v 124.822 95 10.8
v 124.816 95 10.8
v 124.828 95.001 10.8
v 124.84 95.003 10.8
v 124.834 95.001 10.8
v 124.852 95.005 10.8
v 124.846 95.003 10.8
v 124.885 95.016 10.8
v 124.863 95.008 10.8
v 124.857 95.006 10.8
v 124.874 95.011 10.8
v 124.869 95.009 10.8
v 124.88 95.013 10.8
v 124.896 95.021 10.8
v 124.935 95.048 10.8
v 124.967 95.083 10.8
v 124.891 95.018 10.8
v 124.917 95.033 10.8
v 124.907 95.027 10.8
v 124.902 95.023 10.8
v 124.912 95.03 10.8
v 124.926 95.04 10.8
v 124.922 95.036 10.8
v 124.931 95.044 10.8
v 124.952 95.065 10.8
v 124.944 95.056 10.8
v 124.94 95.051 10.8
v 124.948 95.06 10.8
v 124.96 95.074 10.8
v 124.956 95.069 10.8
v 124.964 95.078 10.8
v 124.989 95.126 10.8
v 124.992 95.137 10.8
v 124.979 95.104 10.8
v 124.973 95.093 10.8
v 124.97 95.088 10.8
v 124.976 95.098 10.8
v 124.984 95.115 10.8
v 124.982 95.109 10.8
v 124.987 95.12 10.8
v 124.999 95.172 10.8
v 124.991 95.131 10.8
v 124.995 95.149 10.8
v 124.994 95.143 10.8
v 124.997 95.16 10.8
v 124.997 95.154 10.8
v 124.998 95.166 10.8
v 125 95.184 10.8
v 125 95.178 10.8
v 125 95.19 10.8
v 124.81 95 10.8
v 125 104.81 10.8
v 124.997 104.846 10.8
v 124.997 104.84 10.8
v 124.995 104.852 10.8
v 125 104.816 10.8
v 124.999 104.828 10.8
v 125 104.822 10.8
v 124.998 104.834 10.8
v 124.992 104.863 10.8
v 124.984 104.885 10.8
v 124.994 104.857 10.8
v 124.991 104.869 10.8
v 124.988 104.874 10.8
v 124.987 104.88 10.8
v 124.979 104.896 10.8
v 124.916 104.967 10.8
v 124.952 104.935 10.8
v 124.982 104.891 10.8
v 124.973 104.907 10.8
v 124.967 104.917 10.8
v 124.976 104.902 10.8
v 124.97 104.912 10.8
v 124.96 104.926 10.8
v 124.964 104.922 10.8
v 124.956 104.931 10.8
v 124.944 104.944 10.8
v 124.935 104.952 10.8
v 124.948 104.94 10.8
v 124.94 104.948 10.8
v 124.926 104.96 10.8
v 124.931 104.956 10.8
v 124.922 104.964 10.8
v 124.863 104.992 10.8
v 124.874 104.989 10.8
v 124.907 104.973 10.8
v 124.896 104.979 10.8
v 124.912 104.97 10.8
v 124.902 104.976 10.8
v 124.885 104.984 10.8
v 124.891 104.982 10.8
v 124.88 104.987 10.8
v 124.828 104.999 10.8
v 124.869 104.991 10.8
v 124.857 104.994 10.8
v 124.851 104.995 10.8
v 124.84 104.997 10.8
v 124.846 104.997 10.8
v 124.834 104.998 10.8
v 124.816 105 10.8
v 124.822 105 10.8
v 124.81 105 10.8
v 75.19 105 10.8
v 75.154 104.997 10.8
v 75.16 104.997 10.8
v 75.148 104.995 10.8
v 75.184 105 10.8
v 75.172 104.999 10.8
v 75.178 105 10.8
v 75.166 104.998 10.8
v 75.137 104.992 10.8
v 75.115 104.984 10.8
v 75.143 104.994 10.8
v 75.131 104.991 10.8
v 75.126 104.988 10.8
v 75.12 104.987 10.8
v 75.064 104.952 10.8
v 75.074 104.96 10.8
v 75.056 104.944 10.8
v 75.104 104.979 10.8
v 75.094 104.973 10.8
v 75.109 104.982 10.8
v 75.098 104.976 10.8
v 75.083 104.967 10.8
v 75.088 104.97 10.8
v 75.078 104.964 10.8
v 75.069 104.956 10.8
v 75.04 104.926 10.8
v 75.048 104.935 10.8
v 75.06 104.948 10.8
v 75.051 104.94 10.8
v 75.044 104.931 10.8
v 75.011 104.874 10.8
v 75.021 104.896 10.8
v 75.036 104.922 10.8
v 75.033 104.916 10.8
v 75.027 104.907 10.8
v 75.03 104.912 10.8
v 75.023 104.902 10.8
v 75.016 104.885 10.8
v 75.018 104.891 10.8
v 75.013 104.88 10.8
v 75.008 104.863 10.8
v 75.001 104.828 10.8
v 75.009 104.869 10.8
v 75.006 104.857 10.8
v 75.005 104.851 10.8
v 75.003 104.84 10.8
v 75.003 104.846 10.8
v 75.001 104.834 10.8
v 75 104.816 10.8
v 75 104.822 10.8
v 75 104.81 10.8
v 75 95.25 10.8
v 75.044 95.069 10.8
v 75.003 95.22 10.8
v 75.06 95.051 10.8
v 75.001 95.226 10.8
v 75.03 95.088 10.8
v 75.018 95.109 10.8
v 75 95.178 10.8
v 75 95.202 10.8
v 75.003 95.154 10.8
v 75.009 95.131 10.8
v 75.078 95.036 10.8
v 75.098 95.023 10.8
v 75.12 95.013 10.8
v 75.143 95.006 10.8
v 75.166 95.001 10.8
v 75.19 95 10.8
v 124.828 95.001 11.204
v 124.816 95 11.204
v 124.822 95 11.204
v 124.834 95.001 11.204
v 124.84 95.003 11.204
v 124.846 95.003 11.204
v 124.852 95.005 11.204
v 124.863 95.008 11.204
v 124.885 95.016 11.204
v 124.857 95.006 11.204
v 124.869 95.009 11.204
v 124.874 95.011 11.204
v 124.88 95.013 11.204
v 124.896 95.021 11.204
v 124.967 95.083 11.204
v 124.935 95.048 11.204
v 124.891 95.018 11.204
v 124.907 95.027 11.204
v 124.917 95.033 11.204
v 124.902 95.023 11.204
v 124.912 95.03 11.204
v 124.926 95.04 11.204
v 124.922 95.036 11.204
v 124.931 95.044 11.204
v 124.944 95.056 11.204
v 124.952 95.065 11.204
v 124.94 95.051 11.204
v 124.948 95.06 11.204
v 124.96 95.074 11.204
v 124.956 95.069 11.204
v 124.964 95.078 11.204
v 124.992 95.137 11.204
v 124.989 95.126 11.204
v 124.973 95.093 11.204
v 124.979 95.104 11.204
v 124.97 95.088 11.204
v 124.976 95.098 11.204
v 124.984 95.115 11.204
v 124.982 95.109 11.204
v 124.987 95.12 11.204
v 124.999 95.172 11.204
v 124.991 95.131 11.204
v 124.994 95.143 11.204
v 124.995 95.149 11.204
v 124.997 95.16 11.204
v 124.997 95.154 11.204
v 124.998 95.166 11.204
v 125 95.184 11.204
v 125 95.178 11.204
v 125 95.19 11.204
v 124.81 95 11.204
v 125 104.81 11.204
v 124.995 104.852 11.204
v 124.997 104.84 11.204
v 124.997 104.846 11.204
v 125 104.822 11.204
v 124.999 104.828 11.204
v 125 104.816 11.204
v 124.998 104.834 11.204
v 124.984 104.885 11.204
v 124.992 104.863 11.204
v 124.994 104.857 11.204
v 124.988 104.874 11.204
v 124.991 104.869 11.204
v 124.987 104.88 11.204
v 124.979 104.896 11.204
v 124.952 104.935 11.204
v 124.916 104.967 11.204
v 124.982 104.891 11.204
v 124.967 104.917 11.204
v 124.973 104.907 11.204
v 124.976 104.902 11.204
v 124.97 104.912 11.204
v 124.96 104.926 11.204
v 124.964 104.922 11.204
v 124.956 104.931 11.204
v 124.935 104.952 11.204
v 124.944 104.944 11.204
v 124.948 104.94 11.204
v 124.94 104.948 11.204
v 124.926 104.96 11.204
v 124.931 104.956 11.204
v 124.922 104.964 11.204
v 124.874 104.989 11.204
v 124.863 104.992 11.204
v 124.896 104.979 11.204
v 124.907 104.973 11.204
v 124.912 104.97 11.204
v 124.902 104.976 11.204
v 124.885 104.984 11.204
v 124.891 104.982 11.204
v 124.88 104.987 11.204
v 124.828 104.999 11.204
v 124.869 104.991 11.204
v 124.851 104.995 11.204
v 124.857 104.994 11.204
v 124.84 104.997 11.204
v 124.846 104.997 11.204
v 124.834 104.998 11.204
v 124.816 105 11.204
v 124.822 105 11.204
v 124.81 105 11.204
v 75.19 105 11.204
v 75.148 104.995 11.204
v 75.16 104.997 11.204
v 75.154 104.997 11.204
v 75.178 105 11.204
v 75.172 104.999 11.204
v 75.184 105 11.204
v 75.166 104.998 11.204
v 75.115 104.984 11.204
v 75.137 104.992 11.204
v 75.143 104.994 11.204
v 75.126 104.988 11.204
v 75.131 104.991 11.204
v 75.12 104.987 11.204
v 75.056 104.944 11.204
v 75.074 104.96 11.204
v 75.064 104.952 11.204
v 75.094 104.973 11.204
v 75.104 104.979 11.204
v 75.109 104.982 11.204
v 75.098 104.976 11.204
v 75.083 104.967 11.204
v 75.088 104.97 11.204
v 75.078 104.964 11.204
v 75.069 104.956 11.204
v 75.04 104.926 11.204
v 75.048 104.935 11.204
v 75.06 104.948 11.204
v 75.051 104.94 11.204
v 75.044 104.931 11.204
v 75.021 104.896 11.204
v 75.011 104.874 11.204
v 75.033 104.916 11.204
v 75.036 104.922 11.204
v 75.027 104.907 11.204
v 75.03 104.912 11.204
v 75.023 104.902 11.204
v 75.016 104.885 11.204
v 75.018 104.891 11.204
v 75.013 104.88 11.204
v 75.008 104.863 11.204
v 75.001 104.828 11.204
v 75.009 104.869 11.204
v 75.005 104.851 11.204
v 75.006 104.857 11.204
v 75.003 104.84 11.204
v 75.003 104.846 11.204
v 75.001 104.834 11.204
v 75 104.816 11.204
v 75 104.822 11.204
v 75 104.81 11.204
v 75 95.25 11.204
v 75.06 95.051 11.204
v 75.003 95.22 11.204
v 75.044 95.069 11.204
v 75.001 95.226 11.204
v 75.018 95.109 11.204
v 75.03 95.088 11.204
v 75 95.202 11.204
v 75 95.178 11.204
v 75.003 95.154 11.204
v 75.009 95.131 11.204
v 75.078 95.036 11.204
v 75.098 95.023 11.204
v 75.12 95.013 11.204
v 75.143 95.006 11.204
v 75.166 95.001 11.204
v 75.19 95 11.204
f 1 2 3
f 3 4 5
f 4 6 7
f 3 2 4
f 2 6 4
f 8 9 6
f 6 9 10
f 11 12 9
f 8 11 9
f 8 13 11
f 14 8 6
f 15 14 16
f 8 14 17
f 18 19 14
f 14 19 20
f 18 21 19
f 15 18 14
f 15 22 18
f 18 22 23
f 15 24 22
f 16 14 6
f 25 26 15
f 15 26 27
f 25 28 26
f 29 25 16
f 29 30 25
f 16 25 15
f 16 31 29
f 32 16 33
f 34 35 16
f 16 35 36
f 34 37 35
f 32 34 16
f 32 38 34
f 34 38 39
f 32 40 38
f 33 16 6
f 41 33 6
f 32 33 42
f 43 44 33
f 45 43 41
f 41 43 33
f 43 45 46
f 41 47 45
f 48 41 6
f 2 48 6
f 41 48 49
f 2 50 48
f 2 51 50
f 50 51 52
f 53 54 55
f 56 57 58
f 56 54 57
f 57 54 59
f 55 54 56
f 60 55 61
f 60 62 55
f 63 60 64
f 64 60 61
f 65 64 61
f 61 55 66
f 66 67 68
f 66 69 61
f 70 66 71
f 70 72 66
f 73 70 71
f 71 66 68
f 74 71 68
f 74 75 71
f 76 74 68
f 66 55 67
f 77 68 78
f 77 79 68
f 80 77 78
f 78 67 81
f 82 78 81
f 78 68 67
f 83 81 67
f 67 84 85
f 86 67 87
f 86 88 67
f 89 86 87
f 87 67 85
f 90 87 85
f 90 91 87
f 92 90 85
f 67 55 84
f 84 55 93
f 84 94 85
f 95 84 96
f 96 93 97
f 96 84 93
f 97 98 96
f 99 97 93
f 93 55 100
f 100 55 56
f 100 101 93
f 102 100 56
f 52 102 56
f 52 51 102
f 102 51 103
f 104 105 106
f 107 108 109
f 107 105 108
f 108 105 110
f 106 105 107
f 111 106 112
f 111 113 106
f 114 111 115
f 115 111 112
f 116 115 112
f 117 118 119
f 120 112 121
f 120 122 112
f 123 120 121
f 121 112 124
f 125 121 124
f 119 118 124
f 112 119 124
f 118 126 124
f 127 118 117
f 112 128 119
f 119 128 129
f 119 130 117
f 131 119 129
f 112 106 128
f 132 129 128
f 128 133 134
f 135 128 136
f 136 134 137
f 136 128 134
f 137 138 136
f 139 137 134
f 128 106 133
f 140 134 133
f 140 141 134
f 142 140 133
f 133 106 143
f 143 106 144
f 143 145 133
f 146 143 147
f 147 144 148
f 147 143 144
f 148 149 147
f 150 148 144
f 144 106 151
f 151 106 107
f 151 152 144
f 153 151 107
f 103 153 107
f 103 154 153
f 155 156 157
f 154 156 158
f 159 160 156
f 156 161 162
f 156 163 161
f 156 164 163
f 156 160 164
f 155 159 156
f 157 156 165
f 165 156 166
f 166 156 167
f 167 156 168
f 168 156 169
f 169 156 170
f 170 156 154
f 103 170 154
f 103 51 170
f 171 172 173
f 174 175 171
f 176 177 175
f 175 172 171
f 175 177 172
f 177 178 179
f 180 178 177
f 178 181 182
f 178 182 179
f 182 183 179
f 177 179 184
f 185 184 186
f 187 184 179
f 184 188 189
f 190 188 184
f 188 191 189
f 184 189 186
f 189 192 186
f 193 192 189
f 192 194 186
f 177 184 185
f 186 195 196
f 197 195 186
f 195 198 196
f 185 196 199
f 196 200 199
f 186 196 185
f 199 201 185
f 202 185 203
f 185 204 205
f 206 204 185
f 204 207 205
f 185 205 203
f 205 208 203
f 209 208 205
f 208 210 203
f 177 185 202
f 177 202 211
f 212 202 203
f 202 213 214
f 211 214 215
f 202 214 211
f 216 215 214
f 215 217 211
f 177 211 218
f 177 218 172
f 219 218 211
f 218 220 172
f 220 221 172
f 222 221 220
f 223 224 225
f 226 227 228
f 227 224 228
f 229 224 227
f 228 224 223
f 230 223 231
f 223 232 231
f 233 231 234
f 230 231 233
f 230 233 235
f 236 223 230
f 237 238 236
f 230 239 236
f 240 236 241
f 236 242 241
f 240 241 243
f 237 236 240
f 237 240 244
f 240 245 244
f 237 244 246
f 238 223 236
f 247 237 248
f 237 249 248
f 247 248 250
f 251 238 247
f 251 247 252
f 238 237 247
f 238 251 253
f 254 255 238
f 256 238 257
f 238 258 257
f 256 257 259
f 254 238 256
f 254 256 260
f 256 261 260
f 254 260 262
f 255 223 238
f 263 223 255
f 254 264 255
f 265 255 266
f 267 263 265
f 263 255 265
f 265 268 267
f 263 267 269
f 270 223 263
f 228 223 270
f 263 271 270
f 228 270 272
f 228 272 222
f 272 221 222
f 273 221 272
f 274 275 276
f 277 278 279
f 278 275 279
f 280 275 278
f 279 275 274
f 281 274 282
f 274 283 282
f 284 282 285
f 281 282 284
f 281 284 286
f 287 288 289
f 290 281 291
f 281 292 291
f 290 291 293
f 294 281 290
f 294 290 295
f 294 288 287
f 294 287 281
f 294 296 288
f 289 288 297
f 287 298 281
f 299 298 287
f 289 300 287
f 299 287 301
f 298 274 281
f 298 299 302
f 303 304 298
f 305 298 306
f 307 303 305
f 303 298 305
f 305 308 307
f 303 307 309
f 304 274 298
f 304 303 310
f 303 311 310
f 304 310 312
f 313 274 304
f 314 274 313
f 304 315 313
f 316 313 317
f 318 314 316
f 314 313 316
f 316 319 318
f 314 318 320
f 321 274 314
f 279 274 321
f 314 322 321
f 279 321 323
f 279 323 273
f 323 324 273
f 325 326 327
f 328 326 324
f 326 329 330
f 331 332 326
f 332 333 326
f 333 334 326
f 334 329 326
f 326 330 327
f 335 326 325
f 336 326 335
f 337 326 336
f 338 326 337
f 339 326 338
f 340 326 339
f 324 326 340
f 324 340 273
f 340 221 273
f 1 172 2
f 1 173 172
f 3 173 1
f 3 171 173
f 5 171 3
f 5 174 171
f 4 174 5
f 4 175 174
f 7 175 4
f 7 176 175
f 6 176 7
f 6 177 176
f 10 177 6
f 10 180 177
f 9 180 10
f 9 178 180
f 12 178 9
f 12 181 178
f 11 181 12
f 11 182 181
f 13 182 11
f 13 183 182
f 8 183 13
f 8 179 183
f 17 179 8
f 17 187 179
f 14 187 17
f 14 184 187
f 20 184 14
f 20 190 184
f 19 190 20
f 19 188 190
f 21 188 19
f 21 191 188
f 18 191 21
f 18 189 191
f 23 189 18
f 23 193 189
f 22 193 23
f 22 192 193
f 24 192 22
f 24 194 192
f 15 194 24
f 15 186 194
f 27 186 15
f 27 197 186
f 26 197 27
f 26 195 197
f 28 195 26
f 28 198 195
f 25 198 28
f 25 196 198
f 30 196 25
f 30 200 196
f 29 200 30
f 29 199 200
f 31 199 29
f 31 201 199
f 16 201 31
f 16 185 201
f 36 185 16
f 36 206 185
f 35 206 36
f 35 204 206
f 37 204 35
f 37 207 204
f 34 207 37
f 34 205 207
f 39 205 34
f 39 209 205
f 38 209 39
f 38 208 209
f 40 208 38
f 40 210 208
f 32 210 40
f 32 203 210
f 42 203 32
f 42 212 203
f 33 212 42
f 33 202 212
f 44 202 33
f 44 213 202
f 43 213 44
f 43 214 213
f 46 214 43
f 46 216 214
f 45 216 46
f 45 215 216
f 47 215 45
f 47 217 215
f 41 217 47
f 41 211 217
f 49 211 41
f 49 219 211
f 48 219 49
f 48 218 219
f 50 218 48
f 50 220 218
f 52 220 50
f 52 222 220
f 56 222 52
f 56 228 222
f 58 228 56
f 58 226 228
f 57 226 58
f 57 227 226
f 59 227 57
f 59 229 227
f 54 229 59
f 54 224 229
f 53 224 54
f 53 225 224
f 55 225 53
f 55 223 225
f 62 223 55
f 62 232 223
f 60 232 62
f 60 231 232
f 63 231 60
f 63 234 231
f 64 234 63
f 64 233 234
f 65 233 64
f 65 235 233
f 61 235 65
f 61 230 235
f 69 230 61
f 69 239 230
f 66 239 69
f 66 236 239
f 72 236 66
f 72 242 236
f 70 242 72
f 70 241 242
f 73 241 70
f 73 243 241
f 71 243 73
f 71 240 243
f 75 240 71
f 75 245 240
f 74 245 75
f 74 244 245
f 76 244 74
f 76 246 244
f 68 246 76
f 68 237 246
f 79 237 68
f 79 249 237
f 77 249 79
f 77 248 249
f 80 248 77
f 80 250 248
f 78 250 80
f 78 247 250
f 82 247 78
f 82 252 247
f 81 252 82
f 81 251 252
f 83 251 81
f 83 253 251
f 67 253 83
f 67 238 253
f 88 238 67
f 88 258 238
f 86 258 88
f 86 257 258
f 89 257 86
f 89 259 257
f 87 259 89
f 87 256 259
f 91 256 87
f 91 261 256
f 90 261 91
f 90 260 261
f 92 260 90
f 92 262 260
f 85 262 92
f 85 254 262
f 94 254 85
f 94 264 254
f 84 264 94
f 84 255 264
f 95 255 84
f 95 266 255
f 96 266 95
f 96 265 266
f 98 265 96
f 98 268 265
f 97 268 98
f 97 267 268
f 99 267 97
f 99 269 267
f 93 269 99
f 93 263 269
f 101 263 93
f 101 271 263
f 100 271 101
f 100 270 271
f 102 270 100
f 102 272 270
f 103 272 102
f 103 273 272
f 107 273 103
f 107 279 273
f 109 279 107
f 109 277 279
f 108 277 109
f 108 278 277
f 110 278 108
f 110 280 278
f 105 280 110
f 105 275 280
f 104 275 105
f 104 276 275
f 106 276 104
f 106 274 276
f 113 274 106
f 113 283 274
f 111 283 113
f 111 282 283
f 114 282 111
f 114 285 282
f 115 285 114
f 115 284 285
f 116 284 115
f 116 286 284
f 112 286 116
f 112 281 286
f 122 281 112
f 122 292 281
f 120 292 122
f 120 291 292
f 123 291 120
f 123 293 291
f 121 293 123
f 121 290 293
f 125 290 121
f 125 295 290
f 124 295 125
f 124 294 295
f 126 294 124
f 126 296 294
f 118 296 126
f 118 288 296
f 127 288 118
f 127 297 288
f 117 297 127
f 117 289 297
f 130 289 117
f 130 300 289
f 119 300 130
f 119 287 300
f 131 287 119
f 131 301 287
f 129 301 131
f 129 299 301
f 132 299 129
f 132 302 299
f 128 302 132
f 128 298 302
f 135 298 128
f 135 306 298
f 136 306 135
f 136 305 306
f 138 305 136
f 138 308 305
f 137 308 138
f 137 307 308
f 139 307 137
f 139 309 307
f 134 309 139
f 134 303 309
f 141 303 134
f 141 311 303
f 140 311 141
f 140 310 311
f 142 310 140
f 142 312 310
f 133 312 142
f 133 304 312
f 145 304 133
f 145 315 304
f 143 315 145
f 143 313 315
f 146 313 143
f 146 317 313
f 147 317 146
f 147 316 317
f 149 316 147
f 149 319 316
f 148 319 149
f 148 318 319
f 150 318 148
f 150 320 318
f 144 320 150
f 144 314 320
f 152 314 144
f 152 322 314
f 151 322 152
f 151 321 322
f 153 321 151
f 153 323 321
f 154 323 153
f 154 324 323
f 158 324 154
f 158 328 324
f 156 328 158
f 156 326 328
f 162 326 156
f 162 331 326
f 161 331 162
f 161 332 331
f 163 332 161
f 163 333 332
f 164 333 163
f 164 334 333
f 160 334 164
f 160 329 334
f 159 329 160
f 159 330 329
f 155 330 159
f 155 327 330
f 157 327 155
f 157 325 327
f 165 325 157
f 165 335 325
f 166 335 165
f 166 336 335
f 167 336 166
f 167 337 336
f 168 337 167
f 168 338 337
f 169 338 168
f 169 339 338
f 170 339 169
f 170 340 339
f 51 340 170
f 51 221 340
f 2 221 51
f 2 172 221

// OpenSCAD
module drawBasicShape(x1, y1, x2, y2, width)
{
	length = sqrt((x1-x2)*(x1-x2) + (y1-y2)*(y1-y2));
	if (width!=0.0) {
		square(size = [width, length], center = false);
		translate([width/2.0, 0, 0]) circle(d=width);
		translate([width/2.0, length, 0]) circle(d=width);
	}
}

module translateAndRotate(x1, y1, x2, y2, width)
{
	if (width != 0.0) {
		angle = atan((y2-y1)/(x2-x1)) +270;
		if (x2>=x1) {
			translate([x1, y1, 0.0]) rotate([0.0, 0.0, angle]) translate([-width/2.0, 0.0, 0.0]) scale([1.0, 1.0, 1.0]) drawBasicShape(x1, y1, x2, y2, width);
		}
		else {
			translate([x1, y1, 0.0]) rotate([0.0, 0.0, angle+180]) translate([-width/2.0, 0.0, 0.0]) scale([1.0, 1.0, 1.0]) drawBasicShape(x1, y1, x2, y2, width);		}
	}
}

$fn=50;

points26 = [
[75.77800000, 95.77800000, 0.00000000],
[124.22200000, 95.77800000, 0.37999548],
[124.22200000, 104.22200000, 0.37997788],
[75.77800000, 104.22200000, 0.37999672],
[75.77800000, 95.83800000, 0.37997423],
[75.48400000, 95.48400000, 0.00000000],
[124.51600000, 95.48400000, 0.37999868],
[124.51600000, 104.51600000, 0.37998977],
[75.48400000, 104.51600000, 0.37999746],
[75.48400000, 95.54400000, 0.37999314],
[75.19000000, 95.19000000, 0.00000000],
[124.81000000, 95.19000000, 0.37999939],
[124.81000000, 104.81000000, 0.38000021],
[75.19000000, 104.81000000, 0.37999939],
[75.19000000, 95.25000000, 0.38000344],
[75.53600000, 95.39000000, 0.00000000],
[75.94600000, 103.88900000, 0.00000000],
[76.11100000, 104.05400000, 0.37961375],
[76.52800000, 104.05400000, 0.38001190],
[75.94600000, 103.47200000, 0.37989934],
[75.94600000, 103.05500000, 0.38001190],
[76.94500000, 104.05400000, 0.37998907],
[77.36200000, 104.05400000, 0.38001190],
[75.94600000, 102.63800000, 0.37999592],
[75.94600000, 102.22100000, 0.38001190],
[77.77900000, 104.05400000, 0.37999966],
[78.19600000, 104.05400000, 0.38001190],
[75.94600000, 101.80400000, 0.38002091],
[75.94600000, 101.38700000, 0.38001190],
[78.61300000, 104.05400000, 0.38001957],
[79.03000000, 104.05400000, 0.38001190],
[75.94600000, 100.97000000, 0.38001859],
[75.94600000, 100.55300000, 0.38001190],
[79.44700000, 104.05400000, 0.38002999],
[79.86400000, 104.05400000, 0.38001190],
[75.94600000, 100.13600000, 0.38001726],
[75.94600000, 99.71900000, 0.38015610],
[80.28100000, 104.05400000, 0.38002660],
[80.69800000, 104.05400000, 0.38001190],
[75.94600000, 99.30200000, 0.38002534],
[75.94600000, 98.88500000, 0.38015610],
[81.11500000, 104.05400000, 0.38002430],
[81.53300000, 104.05400000, 0.37945200],
[75.94600000, 98.46700000, 0.37997836],
[75.94600000, 98.05000000, 0.38001190],
[81.95000000, 104.05400000, 0.37998072],
[82.36700000, 104.05400000, 0.38001190],
[75.94600000, 97.63300000, 0.37998939],
[75.94600000, 97.21600000, 0.38001190],
[82.78400000, 104.05400000, 0.37999079],
[83.20100000, 104.05400000, 0.38015610],
[75.94600000, 96.79900000, 0.37999203],
[75.94600000, 96.38200000, 0.38001190],
[83.61800000, 104.05400000, 0.37999868],
[84.03500000, 104.05400000, 0.38001190],
[75.95600000, 95.97600000, 0.38000275],
[76.34400000, 95.94600000, 0.37958004],
[84.45200000, 104.05400000, 0.38000229],
[84.86900000, 104.05400000, 0.38015610],
[76.76100000, 95.94600000, 0.38000229],
[77.17800000, 95.94600000, 0.38001190],
[85.28600000, 104.05400000, 0.38000229],
[85.70300000, 104.05400000, 0.38015610],
[77.59500000, 95.94600000, 0.38000229],
[78.01200000, 95.94600000, 0.38001190],
[86.12000000, 104.05400000, 0.38000754],
[86.53700000, 104.05400000, 0.38001190],
[78.42900000, 95.94600000, 0.38000229],
[78.84600000, 95.94600000, 0.38015610],
[86.95400000, 104.05400000, 0.38000229],
[87.37100000, 104.05400000, 0.38001190],
[79.26300000, 95.94600000, 0.38000229],
[79.68000000, 95.94600000, 0.38015610],
[87.78900000, 104.05400000, 0.37998415],
[88.20600000, 104.05400000, 0.38001190],
[80.09700000, 95.94600000, 0.37998940],
[80.51500000, 95.94600000, 0.37930814],
[88.62300000, 104.05400000, 0.38000229],
[89.04000000, 104.05400000, 0.38001190],
[80.93200000, 95.94600000, 0.38000754],
[81.34900000, 95.94600000, 0.38001190],
[89.45700000, 104.05400000, 0.38000229],
[89.87400000, 104.05400000, 0.38015610],
[81.76600000, 95.94600000, 0.38000229],
[82.18300000, 95.94600000, 0.38001190],
[90.29100000, 104.05400000, 0.38000754],
[90.70800000, 104.05400000, 0.38001190],
[82.60000000, 95.94600000, 0.38000229],
[83.01700000, 95.94600000, 0.38001190],
[91.12500000, 104.05400000, 0.38000754],
[91.54200000, 104.05400000, 0.38001190],
[83.43400000, 95.94600000, 0.38000229],
[83.85100000, 95.94600000, 0.38015610],
[91.95900000, 104.05400000, 0.38000229],
[92.37600000, 104.05400000, 0.38001190],
[84.26800000, 95.94600000, 0.38000754],
[84.68500000, 95.94600000, 0.38001190],
[92.79300000, 104.05400000, 0.38000229],
[93.21000000, 104.05400000, 0.38001190],
[85.10200000, 95.94600000, 0.38000754],
[85.51900000, 95.94600000, 0.38001190],
[93.62700000, 104.05400000, 0.38000229],
[94.04400000, 104.05400000, 0.38015610],
[85.93600000, 95.94600000, 0.38000229],
[86.35300000, 95.94600000, 0.38001190],
[94.46200000, 104.05400000, 0.37998940],
[94.87900000, 104.05400000, 0.38001190],
[86.77000000, 95.94600000, 0.37998415],
[87.18800000, 95.94600000, 0.37930814],
[95.29600000, 104.05400000, 0.38000754],
[95.71300000, 104.05400000, 0.38001190],
[87.60500000, 95.94600000, 0.38000229],
[88.02200000, 95.94600000, 0.38015610],
[96.13000000, 104.05400000, 0.38000229],
[96.54700000, 104.05400000, 0.38001190],
[88.43900000, 95.94600000, 0.38000754],
[88.85600000, 95.94600000, 0.38001190],
[96.96400000, 104.05400000, 0.38000229],
[97.38100000, 104.05400000, 0.38001190],
[89.27300000, 95.94600000, 0.38000754],
[89.69000000, 95.94600000, 0.38001190],
[97.79800000, 104.05400000, 0.38000229],
[98.21500000, 104.05400000, 0.38015610],
[90.10700000, 95.94600000, 0.38000229],
[90.52400000, 95.94600000, 0.38001190],
[98.63200000, 104.05400000, 0.38000754],
[99.04900000, 104.05400000, 0.38001190],
[90.94100000, 95.94600000, 0.38000229],
[91.35800000, 95.94600000, 0.38001190],
[99.46600000, 104.05400000, 0.38000754],
[99.88300000, 104.05400000, 0.38001190],
[91.77500000, 95.94600000, 0.38000229],
[92.19200000, 95.94600000, 0.38015610],
[100.30000000, 104.05400000, 0.38000229],
[100.71800000, 104.05400000, 0.37930814],
[92.60900000, 95.94600000, 0.37998940],
[93.02600000, 95.94600000, 0.38001190],
[101.13500000, 104.05400000, 0.37998415],
[101.55200000, 104.05400000, 0.38001190],
[93.44400000, 95.94600000, 0.38000754],
[93.86100000, 95.94600000, 0.38001190],
[101.96900000, 104.05400000, 0.38000229],
[102.38600000, 104.05400000, 0.38015610],
[94.27800000, 95.94600000, 0.38000229],
[94.69500000, 95.94600000, 0.38001190],
[102.80300000, 104.05400000, 0.38000229],
[103.22000000, 104.05400000, 0.38015610],
[95.11200000, 95.94600000, 0.38000229],
[95.52900000, 95.94600000, 0.38001190],
[103.63700000, 104.05400000, 0.38000754],
[104.05400000, 104.05400000, 0.38001190],
[95.94600000, 95.94600000, 0.38000229],
[96.36300000, 95.94600000, 0.38015610],
[104.47100000, 104.05400000, 0.38000229],
[104.88800000, 104.05400000, 0.38001190],
[96.78000000, 95.94600000, 0.38000229],
[97.19700000, 95.94600000, 0.38015610],
[105.30500000, 104.05400000, 0.38000229],
[105.72200000, 104.05400000, 0.38001190],
[97.61400000, 95.94600000, 0.38000754],
[98.03100000, 95.94600000, 0.38001190],
[106.13900000, 104.05400000, 0.38000229],
[106.55600000, 104.05400000, 0.38001190],
[98.44800000, 95.94600000, 0.38000754],
[98.86500000, 95.94600000, 0.38001190],
[106.97300000, 104.05400000, 0.38000229],
[107.39100000, 104.05400000, 0.37945200],
[99.28200000, 95.94600000, 0.37998415],
[99.69900000, 95.94600000, 0.38001190],
[107.80800000, 104.05400000, 0.37998940],
[108.22500000, 104.05400000, 0.38001190],
[100.11700000, 95.94600000, 0.38000229],
[100.53400000, 95.94600000, 0.38001190],
[108.64200000, 104.05400000, 0.38000754],
[109.05900000, 104.05400000, 0.38001190],
[100.95100000, 95.94600000, 0.38000229],
[101.36800000, 95.94600000, 0.38015610],
[109.47600000, 104.05400000, 0.38000229],
[109.89300000, 104.05400000, 0.38001190],
[101.78500000, 95.94600000, 0.38000754],
[102.20200000, 95.94600000, 0.38001190],
[110.31000000, 104.05400000, 0.38000229],
[110.72700000, 104.05400000, 0.38001190],
[102.61900000, 95.94600000, 0.38000754],
[103.03600000, 95.94600000, 0.38001190],
[111.14400000, 104.05400000, 0.38000229],
[111.56100000, 104.05400000, 0.38015610],
[103.45300000, 95.94600000, 0.38000229],
[103.87000000, 95.94600000, 0.38001190],
[111.97800000, 104.05400000, 0.38000754],
[112.39500000, 104.05400000, 0.38001190],
[104.28700000, 95.94600000, 0.38000229],
[104.70400000, 95.94600000, 0.38001190],
[112.81200000, 104.05400000, 0.38000754],
[113.22900000, 104.05400000, 0.38001190],
[105.12100000, 95.94600000, 0.38000229],
[105.53800000, 95.94600000, 0.38015610],
[113.64700000, 104.05400000, 0.37998415],
[114.06400000, 104.05400000, 0.38001190],
[105.95500000, 95.94600000, 0.37998940],
[106.37300000, 95.94600000, 0.37930814],
[114.48100000, 104.05400000, 0.38000229],
[114.89800000, 104.05400000, 0.38001190],
[106.79000000, 95.94600000, 0.38000754],
[107.20700000, 95.94600000, 0.38001190],
[115.31500000, 104.05400000, 0.38000229],
[115.73200000, 104.05400000, 0.38015610],
[107.62400000, 95.94600000, 0.38000229],
[108.04100000, 95.94600000, 0.38001190],
[116.14900000, 104.05400000, 0.38000754],
[116.56600000, 104.05400000, 0.38001190],
[108.45800000, 95.94600000, 0.38000229],
[108.87500000, 95.94600000, 0.38001190],
[116.98300000, 104.05400000, 0.38000754],
[117.40000000, 104.05400000, 0.38001190],
[109.29200000, 95.94600000, 0.38000229],
[109.70900000, 95.94600000, 0.38015610],
[117.81700000, 104.05400000, 0.38000229],
[118.23400000, 104.05400000, 0.38001190],
[110.12600000, 95.94600000, 0.38000229],
[110.54300000, 95.94600000, 0.38015610],
[118.65100000, 104.05400000, 0.38000229],
[119.06800000, 104.05400000, 0.38001190],
[110.96000000, 95.94600000, 0.38000754],
[111.37700000, 95.94600000, 0.38001190],
[119.48500000, 104.05400000, 0.38000229],
[119.90200000, 104.05400000, 0.38001190],
[111.79400000, 95.94600000, 0.38000754],
[112.21100000, 95.94600000, 0.38001190],
[120.32000000, 104.05400000, 0.37998415],
[120.73700000, 104.05400000, 0.38015610],
[112.62900000, 95.94600000, 0.38000229],
[113.04600000, 95.94600000, 0.38001190],
[121.15400000, 104.05400000, 0.38000754],
[121.57100000, 104.05400000, 0.38001190],
[113.46300000, 95.94600000, 0.38000229],
[113.88000000, 95.94600000, 0.38001190],
[121.98800000, 104.05400000, 0.38000754],
[122.40500000, 104.05400000, 0.38001190],
[114.29700000, 95.94600000, 0.38000229],
[114.71400000, 95.94600000, 0.38015610],
[122.82200000, 104.05400000, 0.38000229],
[123.23900000, 104.05400000, 0.38001190],
[115.13100000, 95.94600000, 0.38000754],
[115.54800000, 95.94600000, 0.38001190],
[123.65600000, 104.05400000, 0.38000229],
[124.04400000, 104.02500000, 0.37963728],
[115.96500000, 95.94600000, 0.37998455],
[116.38200000, 95.94600000, 0.38015610],
[124.05400000, 103.61800000, 0.37999868],
[124.05400000, 103.20100000, 0.38001190],
[116.79900000, 95.94600000, 0.37999203],
[117.21600000, 95.94600000, 0.38015610],
[124.05400000, 102.78400000, 0.37999079],
[124.05400000, 102.36700000, 0.38001190],
[117.63300000, 95.94600000, 0.37998939],
[118.05000000, 95.94600000, 0.38015610],
[124.05400000, 101.95000000, 0.37998072],
[124.05400000, 101.53300000, 0.38015610],
[118.46700000, 95.94600000, 0.37997836],
[118.88400000, 95.94600000, 0.38001190],
[124.05400000, 101.11600000, 0.37997562],
[124.05400000, 100.69800000, 0.37930814],
[119.30200000, 95.94600000, 0.38003429],
[119.71900000, 95.94600000, 0.38001190],
[124.05400000, 100.28100000, 0.38003640],
[124.05400000, 99.86400000, 0.38001190],
[120.13600000, 95.94600000, 0.38002811],
[120.55300000, 95.94600000, 0.38001190],
[124.05400000, 99.44700000, 0.38002999],
[124.05400000, 99.03000000, 0.38001190],
[120.97000000, 95.94600000, 0.38003238],
[121.38700000, 95.94600000, 0.38001190],
[124.05400000, 98.61300000, 0.38001957],
[124.05400000, 98.19600000, 0.38001190],
[121.80400000, 95.94600000, 0.38002091],
[122.22100000, 95.94600000, 0.38001190],
[124.05400000, 97.77900000, 0.38002285],
[124.05400000, 97.36200000, 0.38001190],
[122.63800000, 95.94600000, 0.37999592],
[123.05500000, 95.94600000, 0.38001190],
[124.05400000, 96.94500000, 0.37998907],
[124.05400000, 96.52800000, 0.38001190],
[123.47200000, 95.94600000, 0.37997240],
[123.88900000, 95.94600000, 0.38001190],
[124.05400000, 96.11100000, 0.37961375],
];

translate([0.0, 0.0, 10.80000000]) {
	linear_extrude(height = 0.40400000, center = false, convexity = 10, twist = 0) {
		union() {
			for( i=[0:len(points26)-2] ){ 
				x1 = points26[i][0];
				y1 = points26[i][1];
				x2 = points26[i+1][0];
				y2 = points26[i+1][1];
				width = points26[i+1][2];
				translateAndRotate(x1, y1, x2, y2, width);
			}
		}
	}
}
